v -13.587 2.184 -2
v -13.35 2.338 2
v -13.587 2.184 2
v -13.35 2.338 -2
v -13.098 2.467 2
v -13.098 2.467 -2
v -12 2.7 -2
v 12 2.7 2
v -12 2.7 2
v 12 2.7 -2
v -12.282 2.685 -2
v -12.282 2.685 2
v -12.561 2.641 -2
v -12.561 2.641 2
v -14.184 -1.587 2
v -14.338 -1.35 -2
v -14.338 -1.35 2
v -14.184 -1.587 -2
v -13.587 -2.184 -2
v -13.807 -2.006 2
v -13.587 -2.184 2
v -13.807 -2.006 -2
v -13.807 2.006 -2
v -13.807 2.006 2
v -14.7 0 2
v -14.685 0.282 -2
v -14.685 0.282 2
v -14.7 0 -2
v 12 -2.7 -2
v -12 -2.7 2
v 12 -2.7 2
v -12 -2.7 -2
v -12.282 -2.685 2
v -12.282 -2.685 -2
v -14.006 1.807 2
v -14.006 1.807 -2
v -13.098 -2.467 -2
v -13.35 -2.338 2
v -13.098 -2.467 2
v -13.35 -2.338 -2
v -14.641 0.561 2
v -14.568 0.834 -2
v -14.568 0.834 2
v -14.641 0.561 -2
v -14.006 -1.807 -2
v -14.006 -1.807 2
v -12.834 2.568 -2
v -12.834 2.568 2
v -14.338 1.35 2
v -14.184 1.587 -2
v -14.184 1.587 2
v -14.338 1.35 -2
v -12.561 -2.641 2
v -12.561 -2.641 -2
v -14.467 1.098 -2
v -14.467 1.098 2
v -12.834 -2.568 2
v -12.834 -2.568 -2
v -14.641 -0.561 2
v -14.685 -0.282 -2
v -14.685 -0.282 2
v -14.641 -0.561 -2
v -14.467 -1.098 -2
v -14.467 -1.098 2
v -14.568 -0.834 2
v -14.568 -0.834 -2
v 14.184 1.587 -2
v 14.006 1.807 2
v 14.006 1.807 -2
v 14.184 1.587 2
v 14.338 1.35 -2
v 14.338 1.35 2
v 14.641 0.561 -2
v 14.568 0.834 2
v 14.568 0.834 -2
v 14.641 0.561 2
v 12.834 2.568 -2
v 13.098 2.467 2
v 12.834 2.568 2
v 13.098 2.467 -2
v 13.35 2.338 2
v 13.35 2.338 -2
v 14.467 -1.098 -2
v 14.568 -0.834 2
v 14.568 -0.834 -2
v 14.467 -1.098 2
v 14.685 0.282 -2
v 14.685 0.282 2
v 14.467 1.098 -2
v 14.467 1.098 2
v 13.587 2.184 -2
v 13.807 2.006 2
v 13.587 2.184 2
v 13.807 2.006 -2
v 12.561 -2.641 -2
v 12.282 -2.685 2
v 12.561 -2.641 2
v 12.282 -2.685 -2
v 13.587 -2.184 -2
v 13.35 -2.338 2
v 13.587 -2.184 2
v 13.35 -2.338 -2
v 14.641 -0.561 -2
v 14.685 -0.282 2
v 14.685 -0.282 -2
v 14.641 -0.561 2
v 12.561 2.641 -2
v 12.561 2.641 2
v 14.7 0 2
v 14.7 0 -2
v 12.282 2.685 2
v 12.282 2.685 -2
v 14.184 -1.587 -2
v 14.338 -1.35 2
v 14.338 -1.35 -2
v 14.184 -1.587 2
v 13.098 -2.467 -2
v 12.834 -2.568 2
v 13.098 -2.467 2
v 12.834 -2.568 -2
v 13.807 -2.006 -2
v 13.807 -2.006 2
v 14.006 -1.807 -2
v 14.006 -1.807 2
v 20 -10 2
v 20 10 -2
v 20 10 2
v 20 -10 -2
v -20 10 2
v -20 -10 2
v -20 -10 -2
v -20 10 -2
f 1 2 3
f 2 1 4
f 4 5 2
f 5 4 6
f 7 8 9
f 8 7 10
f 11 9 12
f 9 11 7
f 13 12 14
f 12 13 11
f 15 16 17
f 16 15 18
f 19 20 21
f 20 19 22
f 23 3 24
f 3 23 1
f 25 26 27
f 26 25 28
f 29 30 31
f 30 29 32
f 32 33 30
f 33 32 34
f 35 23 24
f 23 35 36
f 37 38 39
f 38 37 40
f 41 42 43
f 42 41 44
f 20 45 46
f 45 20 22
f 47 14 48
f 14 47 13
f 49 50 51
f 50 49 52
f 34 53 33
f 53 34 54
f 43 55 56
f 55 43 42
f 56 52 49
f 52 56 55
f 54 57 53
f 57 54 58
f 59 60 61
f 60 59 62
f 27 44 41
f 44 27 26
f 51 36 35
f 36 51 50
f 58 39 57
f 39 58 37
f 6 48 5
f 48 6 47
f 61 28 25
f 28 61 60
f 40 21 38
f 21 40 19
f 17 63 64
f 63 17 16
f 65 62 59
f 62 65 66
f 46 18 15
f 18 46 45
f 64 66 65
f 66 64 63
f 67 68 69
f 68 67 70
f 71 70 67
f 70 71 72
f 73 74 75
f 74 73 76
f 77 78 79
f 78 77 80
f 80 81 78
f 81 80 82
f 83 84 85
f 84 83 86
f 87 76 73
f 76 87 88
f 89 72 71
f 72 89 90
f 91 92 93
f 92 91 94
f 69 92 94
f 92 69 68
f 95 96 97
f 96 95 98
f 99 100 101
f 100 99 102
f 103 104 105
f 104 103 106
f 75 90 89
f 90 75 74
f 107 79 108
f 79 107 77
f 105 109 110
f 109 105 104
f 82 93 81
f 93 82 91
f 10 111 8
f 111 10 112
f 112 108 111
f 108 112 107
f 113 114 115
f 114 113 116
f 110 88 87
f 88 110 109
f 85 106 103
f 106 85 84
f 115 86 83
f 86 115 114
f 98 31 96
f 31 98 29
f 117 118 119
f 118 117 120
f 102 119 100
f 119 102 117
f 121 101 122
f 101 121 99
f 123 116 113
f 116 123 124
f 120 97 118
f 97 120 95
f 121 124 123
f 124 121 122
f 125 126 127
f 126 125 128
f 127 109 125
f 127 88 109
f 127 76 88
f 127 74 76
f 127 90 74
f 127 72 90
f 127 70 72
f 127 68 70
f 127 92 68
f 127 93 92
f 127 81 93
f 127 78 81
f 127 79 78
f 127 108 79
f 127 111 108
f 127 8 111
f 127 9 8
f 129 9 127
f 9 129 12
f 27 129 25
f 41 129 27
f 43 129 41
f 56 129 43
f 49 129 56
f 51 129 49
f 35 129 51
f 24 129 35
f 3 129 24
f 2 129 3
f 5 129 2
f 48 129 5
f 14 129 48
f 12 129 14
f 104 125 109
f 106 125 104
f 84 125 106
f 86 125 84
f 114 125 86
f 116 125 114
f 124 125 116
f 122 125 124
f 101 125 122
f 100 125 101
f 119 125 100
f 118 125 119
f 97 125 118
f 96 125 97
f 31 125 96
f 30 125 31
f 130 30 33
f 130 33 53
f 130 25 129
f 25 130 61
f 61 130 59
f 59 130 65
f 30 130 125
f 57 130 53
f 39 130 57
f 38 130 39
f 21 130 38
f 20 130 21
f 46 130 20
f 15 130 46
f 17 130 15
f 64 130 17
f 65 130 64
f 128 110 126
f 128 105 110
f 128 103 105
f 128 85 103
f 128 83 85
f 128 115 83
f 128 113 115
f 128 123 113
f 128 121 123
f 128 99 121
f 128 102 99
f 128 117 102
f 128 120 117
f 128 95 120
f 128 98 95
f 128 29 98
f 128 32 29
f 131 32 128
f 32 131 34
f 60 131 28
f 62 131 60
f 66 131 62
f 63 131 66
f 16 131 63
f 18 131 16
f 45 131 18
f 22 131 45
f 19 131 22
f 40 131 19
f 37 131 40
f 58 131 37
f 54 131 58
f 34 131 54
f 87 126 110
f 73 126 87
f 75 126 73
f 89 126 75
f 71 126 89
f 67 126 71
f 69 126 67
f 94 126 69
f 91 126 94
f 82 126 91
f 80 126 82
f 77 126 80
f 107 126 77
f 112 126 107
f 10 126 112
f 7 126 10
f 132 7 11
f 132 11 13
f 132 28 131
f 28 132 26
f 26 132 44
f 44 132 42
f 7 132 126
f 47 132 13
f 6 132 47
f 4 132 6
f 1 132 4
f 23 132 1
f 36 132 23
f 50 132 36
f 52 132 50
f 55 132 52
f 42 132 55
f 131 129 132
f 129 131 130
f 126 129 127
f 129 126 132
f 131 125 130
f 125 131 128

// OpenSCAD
// Slotted mounting plate.
$fn = 60;
eps = 0.02;
plate_l = 40;
plate_w = 20;
plate_t = 4;
slot_l = 12;
module slot(x) { hull() { translate([x-slot_l/2,0,-plate_t/2-eps]) cylinder(d=5.4,h=plate_t+2*eps); translate([x+slot_l/2,0,-plate_t/2-eps]) cylinder(d=5.4,h=plate_t+2*eps); } }
difference() { cube([plate_l,plate_w,plate_t],center=true); for(i=[0:1]) slot(-plate_l/2+14+i*(plate_l-28)/max(1,1)); }
